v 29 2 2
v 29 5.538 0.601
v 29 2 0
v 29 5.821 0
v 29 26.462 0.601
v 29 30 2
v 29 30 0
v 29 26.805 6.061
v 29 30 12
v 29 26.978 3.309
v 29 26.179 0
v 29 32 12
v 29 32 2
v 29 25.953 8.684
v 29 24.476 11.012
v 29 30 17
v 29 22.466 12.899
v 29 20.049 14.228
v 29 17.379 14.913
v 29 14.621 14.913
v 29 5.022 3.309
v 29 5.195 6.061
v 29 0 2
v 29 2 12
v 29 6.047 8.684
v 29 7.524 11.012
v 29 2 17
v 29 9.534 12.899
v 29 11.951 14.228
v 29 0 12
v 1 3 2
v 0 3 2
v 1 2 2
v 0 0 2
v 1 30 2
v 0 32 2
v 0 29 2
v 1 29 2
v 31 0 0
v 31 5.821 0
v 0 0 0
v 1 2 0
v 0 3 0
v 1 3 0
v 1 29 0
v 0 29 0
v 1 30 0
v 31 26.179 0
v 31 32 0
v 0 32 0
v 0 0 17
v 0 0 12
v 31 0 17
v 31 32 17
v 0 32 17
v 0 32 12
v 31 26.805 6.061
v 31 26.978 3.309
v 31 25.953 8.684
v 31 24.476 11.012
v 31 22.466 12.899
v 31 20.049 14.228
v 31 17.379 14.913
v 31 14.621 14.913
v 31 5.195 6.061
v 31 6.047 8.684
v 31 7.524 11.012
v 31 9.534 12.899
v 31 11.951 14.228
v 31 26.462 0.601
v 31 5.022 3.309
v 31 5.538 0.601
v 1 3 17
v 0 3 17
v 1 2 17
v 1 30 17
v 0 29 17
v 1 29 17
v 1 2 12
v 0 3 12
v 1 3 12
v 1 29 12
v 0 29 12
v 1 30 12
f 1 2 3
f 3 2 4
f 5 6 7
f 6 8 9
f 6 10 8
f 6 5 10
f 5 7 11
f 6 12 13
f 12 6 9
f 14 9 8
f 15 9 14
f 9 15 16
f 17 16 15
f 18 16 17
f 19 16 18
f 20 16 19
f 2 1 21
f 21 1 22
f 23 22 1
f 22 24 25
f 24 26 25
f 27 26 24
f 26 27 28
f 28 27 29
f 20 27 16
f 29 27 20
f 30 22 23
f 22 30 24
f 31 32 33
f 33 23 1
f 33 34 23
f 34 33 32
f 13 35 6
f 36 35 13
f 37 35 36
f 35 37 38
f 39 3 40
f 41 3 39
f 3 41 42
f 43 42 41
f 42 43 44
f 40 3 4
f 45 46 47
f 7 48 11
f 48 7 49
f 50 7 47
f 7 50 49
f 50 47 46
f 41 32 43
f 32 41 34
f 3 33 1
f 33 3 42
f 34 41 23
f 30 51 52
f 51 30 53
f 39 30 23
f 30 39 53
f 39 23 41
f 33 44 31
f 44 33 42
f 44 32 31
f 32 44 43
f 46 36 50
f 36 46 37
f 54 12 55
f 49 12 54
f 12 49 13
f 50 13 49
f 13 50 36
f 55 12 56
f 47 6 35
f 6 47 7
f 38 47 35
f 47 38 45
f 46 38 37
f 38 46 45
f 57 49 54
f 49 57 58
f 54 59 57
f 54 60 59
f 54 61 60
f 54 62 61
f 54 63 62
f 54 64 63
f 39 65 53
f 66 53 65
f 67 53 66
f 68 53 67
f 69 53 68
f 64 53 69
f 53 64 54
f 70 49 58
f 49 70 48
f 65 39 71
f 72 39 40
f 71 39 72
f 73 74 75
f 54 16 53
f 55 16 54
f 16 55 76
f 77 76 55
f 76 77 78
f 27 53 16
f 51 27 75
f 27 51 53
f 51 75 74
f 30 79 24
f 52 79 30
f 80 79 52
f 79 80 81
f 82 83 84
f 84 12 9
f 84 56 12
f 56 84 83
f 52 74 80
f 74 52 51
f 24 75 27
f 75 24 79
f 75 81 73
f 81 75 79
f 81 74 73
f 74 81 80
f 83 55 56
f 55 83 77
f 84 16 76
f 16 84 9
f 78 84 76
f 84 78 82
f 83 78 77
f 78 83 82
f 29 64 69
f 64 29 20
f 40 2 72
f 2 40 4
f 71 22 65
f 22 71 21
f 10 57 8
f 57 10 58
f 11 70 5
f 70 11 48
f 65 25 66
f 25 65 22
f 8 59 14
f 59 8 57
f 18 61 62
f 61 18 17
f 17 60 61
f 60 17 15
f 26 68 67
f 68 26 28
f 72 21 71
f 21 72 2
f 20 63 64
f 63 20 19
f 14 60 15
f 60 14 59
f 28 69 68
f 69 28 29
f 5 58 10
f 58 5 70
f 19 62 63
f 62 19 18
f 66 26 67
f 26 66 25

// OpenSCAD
/*
 * Created by:
 * Thomas Buck <xythobuz@xythobuz.de> in March 2016
 *
 * Licensed under the Creative Commons - Attribution license.
 */

// -----------------------------------------------------------

//translate([-31.784, 42.247, -18.25])
//    import( "/Users/thomas/Downloads/turnigy_3d_fabrikator_y-axis_fan_cheese_fan_bracket.stl");

// -----------------------------------------------------------

top_height = 5;
bottom_height = 2;
distance = 10;
motor_width = 28;
arm_width = 2;
holder_nub = 1;
hole = 22;

$fn = 25;

// -----------------------------------------------------------

// Test rendering of motor
/*
#translate([holder_nub, arm_width, 0])
    cube([motor_width, motor_width, motor_width]);
*/

// -----------------------------------------------------------

module arm(dir = "left", h) {
    cube([motor_width + holder_nub, arm_width, h]);
    
    translate([0, (dir == "right") ? -holder_nub : 0, 0])
        cube([holder_nub, arm_width + holder_nub, h]);
}

module clamp(h) {
    arm("left", h);
    
    translate([0, motor_width + arm_width, 0])
        arm("right", h);
    
    translate([motor_width + holder_nub, 0, 0])
        cube([arm_width, motor_width + (2 * arm_width), h]);
}

module part() {
    clamp(bottom_height);
    
    translate([0, 0, distance + bottom_height])
        clamp(top_height);
    
    translate([motor_width + holder_nub, 0, 0])
        cube([arm_width, motor_width + (2 * arm_width), top_height + distance + bottom_height]);
}

// -----------------------------------------------------------

difference() {
    part();
    
    translate([motor_width + holder_nub - (arm_width / 2), (motor_width / 2) + arm_width, 4])
        rotate([0, 90, 0])
        cylinder(d = hole, h = 2 * arm_width);
}
